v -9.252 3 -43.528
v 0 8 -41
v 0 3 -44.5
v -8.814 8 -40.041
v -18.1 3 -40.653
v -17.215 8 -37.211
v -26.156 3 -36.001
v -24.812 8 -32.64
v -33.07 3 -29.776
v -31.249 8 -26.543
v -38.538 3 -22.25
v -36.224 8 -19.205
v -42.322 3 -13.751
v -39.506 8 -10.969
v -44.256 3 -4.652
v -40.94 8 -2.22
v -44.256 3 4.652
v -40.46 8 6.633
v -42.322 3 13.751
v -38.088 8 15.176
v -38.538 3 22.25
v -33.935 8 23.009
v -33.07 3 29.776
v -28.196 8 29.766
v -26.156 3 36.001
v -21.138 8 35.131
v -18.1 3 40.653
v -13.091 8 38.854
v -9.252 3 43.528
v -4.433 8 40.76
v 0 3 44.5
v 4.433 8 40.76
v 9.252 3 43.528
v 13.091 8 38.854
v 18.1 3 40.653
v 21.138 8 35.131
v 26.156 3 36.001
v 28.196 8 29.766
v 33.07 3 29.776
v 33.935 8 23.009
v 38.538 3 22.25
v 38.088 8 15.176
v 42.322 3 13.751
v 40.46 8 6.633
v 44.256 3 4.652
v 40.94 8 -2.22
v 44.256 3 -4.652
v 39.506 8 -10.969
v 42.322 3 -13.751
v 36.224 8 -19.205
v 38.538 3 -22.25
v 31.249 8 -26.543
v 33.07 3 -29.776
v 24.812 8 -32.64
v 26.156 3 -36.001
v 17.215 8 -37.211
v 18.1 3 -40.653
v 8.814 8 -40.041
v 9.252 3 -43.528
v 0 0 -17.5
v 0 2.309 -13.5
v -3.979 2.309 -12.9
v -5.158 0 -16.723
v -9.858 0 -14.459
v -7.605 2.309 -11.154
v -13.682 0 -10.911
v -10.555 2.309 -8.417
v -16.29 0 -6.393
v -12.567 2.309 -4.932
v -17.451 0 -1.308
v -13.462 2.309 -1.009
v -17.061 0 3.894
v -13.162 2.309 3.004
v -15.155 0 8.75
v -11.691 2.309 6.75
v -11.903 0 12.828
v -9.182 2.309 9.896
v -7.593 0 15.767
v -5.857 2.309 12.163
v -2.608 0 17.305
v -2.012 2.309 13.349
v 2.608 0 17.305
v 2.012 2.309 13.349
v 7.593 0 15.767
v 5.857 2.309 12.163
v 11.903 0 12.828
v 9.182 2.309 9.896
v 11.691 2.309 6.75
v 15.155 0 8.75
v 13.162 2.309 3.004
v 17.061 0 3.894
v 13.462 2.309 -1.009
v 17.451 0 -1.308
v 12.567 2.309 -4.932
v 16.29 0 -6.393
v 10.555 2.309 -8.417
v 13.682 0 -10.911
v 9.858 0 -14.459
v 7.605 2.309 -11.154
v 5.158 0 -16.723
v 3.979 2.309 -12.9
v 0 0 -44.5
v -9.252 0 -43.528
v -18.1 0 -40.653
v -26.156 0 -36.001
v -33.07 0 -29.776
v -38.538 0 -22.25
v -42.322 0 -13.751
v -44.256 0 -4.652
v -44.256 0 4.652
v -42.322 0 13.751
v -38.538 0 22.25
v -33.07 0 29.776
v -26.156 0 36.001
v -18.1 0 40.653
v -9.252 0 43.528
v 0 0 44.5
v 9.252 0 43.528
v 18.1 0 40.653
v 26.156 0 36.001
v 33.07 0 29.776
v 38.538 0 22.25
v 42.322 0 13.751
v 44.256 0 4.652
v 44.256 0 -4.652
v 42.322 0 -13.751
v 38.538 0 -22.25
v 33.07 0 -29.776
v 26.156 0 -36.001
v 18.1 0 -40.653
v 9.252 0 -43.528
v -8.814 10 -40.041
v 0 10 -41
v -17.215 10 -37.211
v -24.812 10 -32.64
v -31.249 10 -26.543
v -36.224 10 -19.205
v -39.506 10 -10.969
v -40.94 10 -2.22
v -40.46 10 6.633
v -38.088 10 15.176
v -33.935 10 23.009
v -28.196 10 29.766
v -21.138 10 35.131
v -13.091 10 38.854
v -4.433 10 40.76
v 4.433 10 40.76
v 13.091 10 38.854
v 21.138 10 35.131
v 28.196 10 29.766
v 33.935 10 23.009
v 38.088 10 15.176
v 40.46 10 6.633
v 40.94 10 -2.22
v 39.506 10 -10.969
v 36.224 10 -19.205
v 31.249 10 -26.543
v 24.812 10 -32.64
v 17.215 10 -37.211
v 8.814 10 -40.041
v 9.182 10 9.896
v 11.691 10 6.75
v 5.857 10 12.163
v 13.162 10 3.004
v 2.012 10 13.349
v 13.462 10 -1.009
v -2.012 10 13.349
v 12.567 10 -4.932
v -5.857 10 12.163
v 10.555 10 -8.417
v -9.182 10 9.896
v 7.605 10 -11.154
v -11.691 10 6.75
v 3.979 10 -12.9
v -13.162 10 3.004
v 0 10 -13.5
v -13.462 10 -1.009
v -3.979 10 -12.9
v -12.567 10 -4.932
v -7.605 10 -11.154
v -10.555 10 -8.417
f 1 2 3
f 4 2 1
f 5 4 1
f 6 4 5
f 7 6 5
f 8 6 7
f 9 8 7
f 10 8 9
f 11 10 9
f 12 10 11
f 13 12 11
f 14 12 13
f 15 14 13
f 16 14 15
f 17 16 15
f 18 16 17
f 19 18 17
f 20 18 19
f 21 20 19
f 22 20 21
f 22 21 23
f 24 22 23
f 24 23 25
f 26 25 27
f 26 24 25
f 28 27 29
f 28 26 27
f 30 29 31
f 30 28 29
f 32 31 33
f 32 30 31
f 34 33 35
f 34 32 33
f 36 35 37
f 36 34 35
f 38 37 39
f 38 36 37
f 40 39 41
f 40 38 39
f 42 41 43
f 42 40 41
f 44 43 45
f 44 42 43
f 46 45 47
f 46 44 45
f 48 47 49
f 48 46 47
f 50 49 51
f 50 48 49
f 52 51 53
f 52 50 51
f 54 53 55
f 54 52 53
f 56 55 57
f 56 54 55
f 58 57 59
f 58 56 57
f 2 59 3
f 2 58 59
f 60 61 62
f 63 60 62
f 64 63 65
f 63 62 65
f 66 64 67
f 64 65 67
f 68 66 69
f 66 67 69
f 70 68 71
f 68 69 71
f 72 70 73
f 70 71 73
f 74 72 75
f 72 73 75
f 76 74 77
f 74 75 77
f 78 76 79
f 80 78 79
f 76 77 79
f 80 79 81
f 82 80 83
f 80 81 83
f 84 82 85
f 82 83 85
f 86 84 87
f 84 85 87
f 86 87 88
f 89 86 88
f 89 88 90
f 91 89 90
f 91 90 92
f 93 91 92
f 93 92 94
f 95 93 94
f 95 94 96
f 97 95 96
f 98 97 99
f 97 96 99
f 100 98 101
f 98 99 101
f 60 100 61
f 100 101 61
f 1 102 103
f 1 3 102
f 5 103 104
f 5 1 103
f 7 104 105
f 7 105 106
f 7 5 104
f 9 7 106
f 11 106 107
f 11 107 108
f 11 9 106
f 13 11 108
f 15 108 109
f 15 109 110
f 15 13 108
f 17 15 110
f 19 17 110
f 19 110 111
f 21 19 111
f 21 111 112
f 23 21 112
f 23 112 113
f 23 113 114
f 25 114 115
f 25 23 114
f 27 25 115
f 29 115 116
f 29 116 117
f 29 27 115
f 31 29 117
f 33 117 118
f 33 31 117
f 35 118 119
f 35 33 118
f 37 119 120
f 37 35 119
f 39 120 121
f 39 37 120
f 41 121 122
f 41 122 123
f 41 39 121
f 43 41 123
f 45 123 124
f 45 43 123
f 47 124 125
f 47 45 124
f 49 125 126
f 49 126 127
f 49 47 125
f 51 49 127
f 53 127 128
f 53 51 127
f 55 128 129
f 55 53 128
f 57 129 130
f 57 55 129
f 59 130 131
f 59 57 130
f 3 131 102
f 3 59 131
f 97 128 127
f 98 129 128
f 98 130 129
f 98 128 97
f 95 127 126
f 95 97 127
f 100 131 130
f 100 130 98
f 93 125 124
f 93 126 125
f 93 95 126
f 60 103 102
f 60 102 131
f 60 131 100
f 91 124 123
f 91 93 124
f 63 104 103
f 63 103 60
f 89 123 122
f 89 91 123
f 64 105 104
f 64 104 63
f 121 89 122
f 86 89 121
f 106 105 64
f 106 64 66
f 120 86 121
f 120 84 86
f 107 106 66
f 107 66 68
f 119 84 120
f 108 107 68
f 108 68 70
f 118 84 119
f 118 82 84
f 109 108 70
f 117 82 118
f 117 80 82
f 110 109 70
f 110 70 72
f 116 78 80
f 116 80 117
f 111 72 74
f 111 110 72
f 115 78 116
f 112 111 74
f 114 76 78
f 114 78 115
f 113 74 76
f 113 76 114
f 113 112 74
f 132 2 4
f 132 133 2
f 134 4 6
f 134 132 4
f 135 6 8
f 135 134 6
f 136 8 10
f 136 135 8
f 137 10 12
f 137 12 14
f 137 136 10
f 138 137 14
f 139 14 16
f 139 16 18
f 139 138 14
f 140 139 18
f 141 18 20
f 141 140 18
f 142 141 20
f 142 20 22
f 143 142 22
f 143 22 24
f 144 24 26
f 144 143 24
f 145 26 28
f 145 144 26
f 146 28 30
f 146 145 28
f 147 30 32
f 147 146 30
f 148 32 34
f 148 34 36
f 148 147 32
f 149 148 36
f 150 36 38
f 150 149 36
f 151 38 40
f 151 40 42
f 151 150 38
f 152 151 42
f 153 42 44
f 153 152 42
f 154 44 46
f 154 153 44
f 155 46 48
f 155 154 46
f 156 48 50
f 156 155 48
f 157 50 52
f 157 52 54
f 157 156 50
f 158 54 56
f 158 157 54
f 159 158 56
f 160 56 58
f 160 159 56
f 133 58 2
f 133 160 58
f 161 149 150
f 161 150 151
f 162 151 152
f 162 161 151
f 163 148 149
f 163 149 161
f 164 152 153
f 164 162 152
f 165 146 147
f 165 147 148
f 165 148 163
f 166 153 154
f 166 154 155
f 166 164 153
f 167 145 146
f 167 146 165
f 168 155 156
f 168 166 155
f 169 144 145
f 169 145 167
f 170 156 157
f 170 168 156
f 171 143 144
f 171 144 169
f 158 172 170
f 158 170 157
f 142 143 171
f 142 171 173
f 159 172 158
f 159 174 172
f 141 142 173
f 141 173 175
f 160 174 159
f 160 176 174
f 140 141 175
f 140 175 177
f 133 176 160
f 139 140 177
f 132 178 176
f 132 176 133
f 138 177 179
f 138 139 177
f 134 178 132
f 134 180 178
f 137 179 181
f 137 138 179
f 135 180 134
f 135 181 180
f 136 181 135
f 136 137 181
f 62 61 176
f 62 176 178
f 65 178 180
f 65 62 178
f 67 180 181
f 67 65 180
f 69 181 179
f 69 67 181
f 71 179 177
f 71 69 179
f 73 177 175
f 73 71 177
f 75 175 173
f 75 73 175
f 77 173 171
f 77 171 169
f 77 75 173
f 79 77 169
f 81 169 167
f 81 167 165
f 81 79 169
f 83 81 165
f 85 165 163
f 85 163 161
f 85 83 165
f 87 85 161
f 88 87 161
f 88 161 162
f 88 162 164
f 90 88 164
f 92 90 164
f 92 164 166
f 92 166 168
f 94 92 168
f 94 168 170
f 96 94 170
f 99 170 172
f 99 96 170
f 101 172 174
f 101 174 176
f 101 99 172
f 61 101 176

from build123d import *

# Parameters (mm, degrees)
CHAMFER_1_SIZE  = 4
CHAMFER_1_SIZE2 = 2.309401077


with BuildPart() as part:
    # Эскиз1 → Повернуть1 (revolve)
    with BuildSketch(Plane.XY, mode=Mode.PRIVATE) as revolve_1_sk:
        Polygon((13.5, 0), (44.5, 0), (44.5, 3), (41, 8), (41, 10), (13.5, 10), align=None)
    revolve(revolve_1_sk.sketch.rotate(Axis((0, 0, 0), (0, 1, 0)), 90), axis=Axis((0, 0, 0), (0, 1, 0)))

    # Фаска1
    chamfer_1_edges = [part.edges().sort_by_distance(p)[0] for p in [
        (0, 0, 13.5),
    ]]
    chamfer_1_side = [part.faces().sort_by_distance(p)[0] for p in [
        (0, 0, 14.758650071),
    ]]
    chamfer(chamfer_1_edges, length=CHAMFER_1_SIZE, length2=CHAMFER_1_SIZE2, reference=chamfer_1_side[0])


solid = part.part
